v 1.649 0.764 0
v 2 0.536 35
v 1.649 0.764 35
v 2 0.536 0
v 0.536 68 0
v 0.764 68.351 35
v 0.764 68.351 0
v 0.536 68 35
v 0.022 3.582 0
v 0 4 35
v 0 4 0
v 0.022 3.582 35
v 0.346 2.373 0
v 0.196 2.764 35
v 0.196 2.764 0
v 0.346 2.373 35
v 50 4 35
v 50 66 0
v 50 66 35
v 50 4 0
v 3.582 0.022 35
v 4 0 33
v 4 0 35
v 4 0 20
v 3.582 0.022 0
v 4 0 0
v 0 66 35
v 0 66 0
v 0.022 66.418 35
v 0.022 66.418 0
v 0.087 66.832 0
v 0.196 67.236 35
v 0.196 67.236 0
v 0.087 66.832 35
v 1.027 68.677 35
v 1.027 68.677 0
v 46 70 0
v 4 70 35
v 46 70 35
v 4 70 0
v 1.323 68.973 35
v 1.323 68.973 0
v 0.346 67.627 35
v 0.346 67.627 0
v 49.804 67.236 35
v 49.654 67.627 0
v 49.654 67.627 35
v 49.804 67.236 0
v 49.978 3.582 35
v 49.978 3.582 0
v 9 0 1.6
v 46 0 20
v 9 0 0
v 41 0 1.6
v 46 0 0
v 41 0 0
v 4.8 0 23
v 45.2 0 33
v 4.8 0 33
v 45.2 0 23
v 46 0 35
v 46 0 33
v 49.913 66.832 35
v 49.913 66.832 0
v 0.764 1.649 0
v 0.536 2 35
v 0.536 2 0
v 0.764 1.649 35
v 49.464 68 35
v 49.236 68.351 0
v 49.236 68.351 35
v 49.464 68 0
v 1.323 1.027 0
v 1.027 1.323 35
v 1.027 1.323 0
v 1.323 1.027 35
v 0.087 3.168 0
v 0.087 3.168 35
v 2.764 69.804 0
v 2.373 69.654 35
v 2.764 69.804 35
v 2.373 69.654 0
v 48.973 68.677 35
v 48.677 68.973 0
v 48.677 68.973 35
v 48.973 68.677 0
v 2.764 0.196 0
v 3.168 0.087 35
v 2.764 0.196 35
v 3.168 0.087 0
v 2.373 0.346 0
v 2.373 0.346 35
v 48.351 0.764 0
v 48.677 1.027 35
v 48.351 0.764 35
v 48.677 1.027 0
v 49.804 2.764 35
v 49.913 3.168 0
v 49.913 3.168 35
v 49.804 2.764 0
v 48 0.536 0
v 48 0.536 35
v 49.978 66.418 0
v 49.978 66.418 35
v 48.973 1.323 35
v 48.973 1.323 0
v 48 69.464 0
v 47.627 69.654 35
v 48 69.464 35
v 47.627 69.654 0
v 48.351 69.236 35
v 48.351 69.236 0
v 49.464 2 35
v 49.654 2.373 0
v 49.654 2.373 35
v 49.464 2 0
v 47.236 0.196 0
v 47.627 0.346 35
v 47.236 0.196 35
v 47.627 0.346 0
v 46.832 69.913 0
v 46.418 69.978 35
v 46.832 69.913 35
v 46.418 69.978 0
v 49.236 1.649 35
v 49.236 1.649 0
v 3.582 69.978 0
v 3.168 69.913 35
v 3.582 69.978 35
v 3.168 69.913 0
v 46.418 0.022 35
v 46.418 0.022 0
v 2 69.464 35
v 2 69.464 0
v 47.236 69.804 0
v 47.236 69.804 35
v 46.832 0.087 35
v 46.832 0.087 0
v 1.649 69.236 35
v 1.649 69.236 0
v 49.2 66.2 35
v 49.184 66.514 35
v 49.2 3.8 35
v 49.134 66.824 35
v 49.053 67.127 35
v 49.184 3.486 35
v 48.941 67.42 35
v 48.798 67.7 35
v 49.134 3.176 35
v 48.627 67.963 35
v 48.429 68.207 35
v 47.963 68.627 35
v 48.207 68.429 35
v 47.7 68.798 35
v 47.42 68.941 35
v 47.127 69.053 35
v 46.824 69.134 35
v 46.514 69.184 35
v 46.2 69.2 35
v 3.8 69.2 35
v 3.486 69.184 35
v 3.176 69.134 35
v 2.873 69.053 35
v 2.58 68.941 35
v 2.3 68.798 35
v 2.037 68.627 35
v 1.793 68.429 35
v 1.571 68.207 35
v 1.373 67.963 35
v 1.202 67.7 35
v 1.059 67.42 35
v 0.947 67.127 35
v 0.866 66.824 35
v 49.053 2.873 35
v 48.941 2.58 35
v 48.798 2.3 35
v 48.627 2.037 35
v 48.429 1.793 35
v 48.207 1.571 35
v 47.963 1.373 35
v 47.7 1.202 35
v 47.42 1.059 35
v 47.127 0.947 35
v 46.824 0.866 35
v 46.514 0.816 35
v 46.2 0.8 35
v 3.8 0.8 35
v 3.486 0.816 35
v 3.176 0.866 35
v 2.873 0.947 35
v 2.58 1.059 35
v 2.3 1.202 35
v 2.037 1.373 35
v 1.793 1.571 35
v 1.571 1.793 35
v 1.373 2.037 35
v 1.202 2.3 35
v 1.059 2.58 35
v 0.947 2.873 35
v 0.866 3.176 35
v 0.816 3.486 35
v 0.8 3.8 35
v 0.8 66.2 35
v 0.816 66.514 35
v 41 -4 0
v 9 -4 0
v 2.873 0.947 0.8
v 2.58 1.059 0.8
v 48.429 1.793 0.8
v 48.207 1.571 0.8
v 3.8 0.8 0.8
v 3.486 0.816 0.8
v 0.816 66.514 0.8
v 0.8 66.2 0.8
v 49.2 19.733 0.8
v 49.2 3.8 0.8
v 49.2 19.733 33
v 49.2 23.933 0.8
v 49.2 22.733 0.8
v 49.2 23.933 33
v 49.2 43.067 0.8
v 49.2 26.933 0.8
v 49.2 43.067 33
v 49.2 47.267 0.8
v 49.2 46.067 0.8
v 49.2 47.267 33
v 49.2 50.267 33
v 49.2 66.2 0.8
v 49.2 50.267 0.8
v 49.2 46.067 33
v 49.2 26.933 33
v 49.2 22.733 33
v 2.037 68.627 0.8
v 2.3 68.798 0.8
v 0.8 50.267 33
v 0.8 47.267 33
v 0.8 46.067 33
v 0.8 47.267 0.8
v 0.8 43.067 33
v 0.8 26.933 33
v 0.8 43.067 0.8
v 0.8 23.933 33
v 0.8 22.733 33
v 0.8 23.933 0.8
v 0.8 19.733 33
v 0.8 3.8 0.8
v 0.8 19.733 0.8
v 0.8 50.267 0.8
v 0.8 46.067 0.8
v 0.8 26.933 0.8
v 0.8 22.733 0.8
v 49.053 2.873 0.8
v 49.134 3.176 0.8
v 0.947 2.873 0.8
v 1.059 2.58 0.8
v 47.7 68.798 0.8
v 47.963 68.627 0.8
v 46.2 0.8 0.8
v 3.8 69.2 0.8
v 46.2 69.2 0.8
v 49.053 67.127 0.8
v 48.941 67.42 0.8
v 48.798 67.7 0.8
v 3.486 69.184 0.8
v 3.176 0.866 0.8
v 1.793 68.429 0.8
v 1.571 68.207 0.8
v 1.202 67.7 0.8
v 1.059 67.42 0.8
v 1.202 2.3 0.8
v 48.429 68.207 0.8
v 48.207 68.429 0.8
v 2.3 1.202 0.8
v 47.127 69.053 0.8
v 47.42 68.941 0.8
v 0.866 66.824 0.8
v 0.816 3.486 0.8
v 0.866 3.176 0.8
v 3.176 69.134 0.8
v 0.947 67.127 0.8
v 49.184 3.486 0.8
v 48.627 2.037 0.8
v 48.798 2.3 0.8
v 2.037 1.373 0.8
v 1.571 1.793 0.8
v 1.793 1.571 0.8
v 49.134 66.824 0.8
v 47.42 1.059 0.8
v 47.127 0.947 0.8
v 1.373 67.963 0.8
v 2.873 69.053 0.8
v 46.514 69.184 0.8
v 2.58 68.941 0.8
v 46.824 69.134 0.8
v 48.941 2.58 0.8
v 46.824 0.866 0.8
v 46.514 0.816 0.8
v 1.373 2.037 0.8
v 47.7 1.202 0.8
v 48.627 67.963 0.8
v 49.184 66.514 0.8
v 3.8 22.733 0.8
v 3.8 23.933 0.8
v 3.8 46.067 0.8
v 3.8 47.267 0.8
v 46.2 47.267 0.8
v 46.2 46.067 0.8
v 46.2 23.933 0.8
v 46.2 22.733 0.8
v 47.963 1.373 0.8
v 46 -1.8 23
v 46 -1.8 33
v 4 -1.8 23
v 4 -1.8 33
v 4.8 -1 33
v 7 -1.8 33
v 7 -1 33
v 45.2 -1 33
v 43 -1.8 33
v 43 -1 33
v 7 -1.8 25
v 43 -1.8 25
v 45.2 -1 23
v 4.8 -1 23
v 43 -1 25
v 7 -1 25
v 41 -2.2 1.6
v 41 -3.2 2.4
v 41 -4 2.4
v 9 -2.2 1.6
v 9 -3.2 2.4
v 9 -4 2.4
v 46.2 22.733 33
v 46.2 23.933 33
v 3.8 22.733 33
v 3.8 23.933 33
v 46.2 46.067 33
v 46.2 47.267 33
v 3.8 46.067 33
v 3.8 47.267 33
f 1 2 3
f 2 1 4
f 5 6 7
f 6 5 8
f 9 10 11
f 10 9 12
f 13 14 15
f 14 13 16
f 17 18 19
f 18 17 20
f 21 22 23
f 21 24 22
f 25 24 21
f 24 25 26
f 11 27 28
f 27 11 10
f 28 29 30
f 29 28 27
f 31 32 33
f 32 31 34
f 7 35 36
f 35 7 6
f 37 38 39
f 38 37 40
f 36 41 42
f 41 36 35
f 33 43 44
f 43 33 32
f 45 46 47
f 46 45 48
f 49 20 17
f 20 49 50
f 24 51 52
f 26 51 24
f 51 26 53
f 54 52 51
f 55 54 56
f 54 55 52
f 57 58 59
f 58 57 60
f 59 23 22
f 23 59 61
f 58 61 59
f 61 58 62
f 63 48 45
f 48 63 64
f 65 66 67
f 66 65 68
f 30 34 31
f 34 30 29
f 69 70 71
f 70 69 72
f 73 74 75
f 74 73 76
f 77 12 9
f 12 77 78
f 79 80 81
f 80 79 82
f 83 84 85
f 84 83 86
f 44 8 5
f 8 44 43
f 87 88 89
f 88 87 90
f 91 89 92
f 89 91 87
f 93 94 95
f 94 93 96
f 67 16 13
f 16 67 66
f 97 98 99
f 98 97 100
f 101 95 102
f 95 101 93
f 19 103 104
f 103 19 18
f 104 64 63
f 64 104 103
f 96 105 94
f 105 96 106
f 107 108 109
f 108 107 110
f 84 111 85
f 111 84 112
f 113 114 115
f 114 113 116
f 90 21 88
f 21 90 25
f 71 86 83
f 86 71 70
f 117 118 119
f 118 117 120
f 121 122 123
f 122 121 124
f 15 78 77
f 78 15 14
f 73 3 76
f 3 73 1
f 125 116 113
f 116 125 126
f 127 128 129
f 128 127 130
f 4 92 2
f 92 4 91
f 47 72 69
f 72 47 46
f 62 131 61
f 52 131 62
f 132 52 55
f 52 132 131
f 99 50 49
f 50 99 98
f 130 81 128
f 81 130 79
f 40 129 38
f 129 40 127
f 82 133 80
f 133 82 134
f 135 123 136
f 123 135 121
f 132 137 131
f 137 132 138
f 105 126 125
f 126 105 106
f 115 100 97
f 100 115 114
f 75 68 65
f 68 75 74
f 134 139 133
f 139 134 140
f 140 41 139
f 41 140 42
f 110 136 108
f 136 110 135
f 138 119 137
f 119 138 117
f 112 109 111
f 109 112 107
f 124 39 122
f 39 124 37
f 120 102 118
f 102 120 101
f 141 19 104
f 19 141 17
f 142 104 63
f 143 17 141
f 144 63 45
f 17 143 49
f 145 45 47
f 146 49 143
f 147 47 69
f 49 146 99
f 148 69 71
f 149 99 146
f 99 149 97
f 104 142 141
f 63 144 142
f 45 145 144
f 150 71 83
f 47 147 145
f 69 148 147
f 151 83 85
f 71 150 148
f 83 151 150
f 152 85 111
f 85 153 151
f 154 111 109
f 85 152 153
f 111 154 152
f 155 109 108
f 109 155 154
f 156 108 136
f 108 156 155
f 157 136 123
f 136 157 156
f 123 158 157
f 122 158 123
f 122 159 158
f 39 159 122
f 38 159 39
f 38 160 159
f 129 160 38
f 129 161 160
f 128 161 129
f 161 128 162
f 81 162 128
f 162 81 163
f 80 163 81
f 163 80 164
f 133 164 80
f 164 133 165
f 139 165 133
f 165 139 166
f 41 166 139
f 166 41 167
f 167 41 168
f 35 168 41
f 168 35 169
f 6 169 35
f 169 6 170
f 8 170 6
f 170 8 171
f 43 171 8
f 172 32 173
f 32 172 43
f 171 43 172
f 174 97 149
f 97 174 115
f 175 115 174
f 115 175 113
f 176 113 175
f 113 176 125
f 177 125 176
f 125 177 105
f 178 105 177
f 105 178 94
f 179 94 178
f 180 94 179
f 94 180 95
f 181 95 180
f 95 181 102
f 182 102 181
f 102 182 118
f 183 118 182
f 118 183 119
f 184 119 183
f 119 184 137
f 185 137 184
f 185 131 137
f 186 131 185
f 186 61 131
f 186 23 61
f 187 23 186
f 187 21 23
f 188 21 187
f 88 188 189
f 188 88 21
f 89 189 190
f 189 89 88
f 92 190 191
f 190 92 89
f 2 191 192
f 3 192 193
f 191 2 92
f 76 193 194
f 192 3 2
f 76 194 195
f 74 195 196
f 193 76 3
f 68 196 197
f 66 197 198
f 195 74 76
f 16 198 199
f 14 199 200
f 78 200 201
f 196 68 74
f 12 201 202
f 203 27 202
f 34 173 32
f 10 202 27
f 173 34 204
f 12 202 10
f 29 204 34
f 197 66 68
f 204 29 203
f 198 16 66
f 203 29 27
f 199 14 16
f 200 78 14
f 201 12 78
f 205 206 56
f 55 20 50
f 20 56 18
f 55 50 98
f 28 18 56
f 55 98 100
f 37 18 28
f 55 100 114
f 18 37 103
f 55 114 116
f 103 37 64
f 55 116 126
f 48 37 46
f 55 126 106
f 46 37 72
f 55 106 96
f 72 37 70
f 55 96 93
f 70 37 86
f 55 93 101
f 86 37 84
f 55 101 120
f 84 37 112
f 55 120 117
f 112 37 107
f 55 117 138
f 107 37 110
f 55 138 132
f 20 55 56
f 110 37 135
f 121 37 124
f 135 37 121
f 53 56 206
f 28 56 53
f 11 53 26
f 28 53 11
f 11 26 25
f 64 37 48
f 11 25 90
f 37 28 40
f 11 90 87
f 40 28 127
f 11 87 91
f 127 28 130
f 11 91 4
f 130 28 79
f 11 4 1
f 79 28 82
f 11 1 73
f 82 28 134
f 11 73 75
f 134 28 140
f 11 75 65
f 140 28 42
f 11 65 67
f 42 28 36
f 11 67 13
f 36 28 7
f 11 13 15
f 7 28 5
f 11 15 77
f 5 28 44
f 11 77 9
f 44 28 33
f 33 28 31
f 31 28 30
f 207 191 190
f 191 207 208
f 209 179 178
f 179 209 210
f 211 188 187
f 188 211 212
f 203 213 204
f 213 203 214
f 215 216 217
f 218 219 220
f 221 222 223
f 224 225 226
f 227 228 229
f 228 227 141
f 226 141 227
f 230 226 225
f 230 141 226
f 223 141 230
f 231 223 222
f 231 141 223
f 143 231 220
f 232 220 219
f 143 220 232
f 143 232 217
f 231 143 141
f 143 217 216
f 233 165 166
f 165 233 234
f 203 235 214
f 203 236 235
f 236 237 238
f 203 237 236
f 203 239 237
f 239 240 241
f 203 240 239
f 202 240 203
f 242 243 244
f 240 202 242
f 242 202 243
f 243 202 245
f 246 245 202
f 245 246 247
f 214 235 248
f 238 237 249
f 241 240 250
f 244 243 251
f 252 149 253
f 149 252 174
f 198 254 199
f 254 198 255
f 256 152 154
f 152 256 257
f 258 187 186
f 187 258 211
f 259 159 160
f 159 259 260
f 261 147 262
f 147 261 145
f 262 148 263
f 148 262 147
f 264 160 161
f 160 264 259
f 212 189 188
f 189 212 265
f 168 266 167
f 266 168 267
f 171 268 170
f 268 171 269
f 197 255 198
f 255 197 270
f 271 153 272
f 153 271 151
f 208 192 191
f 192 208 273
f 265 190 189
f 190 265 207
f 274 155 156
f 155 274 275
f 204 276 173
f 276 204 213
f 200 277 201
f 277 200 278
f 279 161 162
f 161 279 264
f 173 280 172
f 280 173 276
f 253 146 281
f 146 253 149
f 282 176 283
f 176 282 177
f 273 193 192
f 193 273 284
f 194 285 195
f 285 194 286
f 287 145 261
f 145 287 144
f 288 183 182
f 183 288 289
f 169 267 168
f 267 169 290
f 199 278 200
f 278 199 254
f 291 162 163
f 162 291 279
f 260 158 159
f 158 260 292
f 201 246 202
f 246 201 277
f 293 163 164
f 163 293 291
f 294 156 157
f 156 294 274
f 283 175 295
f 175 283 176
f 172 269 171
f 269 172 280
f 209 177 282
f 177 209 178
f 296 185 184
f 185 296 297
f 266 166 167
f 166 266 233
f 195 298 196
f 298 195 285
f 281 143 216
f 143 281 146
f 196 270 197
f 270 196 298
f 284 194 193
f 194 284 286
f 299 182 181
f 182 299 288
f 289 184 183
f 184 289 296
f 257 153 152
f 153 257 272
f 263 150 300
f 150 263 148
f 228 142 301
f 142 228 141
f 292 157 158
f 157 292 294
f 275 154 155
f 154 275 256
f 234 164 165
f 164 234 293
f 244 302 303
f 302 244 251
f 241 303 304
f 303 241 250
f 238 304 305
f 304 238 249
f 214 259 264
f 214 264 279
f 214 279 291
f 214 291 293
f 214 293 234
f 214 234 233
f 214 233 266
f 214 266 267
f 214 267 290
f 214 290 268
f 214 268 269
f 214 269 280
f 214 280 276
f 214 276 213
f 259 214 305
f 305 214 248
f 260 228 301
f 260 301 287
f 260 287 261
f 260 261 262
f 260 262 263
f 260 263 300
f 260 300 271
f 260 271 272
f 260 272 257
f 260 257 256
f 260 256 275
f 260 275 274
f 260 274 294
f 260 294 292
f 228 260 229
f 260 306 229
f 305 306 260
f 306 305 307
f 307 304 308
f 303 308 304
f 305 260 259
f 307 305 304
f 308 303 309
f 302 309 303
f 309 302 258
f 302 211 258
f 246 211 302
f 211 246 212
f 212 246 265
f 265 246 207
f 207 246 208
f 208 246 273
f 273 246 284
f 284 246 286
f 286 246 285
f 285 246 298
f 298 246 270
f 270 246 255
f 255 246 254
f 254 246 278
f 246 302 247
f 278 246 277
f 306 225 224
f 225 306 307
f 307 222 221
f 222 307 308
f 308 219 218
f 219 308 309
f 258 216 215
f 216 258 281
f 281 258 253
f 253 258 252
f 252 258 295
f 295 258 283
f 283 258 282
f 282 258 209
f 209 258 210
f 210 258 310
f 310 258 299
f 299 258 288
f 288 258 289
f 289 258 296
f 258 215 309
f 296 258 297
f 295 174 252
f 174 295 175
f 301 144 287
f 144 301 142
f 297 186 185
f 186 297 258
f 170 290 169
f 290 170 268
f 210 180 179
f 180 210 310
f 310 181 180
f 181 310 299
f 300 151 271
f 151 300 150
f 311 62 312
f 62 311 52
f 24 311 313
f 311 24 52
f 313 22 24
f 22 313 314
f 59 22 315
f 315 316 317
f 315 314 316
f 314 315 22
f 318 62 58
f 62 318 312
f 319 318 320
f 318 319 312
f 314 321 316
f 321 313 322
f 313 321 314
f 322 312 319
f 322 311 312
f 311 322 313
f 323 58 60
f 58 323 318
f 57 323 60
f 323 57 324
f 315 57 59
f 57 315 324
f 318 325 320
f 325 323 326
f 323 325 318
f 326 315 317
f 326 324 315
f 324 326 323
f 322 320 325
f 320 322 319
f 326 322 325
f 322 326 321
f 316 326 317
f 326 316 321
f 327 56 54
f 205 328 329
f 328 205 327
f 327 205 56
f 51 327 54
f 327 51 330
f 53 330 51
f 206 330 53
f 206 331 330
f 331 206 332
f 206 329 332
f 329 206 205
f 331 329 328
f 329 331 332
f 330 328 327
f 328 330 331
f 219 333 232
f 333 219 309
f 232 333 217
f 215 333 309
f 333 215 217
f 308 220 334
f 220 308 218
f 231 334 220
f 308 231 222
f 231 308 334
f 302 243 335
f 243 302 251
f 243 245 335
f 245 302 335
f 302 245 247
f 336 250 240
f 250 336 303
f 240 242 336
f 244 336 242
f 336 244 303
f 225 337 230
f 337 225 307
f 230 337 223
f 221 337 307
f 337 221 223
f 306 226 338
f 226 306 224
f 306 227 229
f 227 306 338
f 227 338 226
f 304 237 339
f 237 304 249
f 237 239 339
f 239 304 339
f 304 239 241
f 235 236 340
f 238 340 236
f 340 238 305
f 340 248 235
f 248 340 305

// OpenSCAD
// little boxes - with handle, tag, separators and lid
// version 0.0.3
// by pixelhaufen
// is licensed under CC BY-SA 3.0 -> https://creativecommons.org/licenses/by-sa/3.0/

//------------------------------------------------------------------
// User Inputs

// create a seperate model for box, lid and separator
type = "box"; // [box,lid,separator]

/* [box] */
box_tag = "yes"; // [yes,no]
box_handle = "yes"; // [yes,no]
separators = 2; //[0:1:3]

/* [size] */
// without lid
width = 50; //[30:200]
// without lid, tag or handle
lenght = 70; //[12:200]
// without lid
height = 35; //[20:200]
// prints best with a multiple of the nozzle diameter
shell = 0.8; //[0.2:0.05:1.5]

/* [experimental] */
stackable = "no"; // [yes,no]

/*[Hidden]*/
$fn=60;

//------------------------------------------------------------------
// Main

if (type=="box")
{
    box([width,lenght,height],shell);
    if(box_tag=="yes")
    {
        tag(width,height,shell);
    }
    if(box_handle=="yes")
    {
        handle(width,shell);
    }
    separator_handle(width,lenght,height,shell,separators);
    
    if(stackable=="yes")
    {
        stackable(width,lenght,height);
    }
}
else if(type=="lid")
{
    lid([width,lenght,3],shell,stackable);
}
else if(type=="separator")
{
    separator(width,height,shell);
}

//------------------------------------------------------------------
// Modules

module separator(width,height,shell)
{
    cube([width-2*shell-0.2,height-shell-2,1]);
}

module stackable(width,lenght,height)
{
    translate([width, lenght/4, height-2])
        rotate([90, 0, 90])
            prism(lenght/2,3,1+shell);
    translate([0, lenght*3/4, height-2])
        rotate([90, 0, -90])
            prism(lenght/2,3,1+shell);
    translate([width*3/4, lenght, height-2])
        rotate([90, 0, 180])
            prism(width/2,3,1+shell);
}

module separator_handle(width,lenght,height,shell,separators)
{
    separators_lenght=lenght/(separators+1);
    if(separators > 0)
    {
        for (i = [1:separators])
        {
            separator_handle_create(width,separators_lenght*i,height,shell,separators);
        }
    }
}

module separator_handle_create(width,lenght,height,shell,separators)
{   
    translate([width-shell, lenght-0.6-3, 0])
        rotate([0, -90, 0])
            prism(height-2,3,3);
    translate([width-3-shell, lenght+0.6, 0])
        rotate([-90, -90, 0])
            prism(height-2,3,3);
    translate([3+shell, lenght-0.6, 0])
        rotate([90, -90, 0])
            prism(height-2,3,3);
    translate([shell, lenght+0.6+3, 0])
        rotate([180, -90, 0])
            prism(height-2,3,3);
}

module tag(width,height,shell)
{
    difference()
    {
        union()
        {
            translate([4, 0, height-15])
                rotate([90, 0, 0])
                    prism(width-8,3,1+shell);
            translate([4, -1-shell, height-12])
                cube([width-8, 1+shell, 10], center=false);
        }
        
        translate([4+shell, -1, height-12])
            cube([width-8-shell*2, 1, 11], center=false);
        translate([7, -2.5, height-10])
            cube([width-14, 2, 10], center=false);
    }
}

module handle(width,shell)
{
    translate([9, -5*shell, 0])
        cube([width-18, 5*shell, 2*shell], center=false);

    translate([9, -5*shell, 2*shell])
        cube([width-18, shell, shell], center=false);

    translate([9, -5*shell+shell, 3*shell])
        rotate([-90, 0, 0])
            prism(width-18,shell,1);
}

module prism(lenght, width, height)
{
    polyhedron
    (
        points=[[0, 0, 0], [lenght, 0, 0], [lenght, width, 0], [0, width, 0], [0, width, height], [lenght, width, height]],
        faces=[[0, 1, 2, 3], [5, 4, 3, 2], [0, 4, 5, 1], [0, 3, 4], [5, 2, 1]]
    );
}

module lid(size,shell,stackable,radius=5)
{
    translate([shell, shell, shell])
    {
        difference()
        {
            translate([-1*shell, -1*shell, -shell])
                main_box([size[0]+shell*2,size[1]+shell*2,size[2]],radius);
            
            union()
            {
                main_box([size[0],size[1],size[2]],radius-shell);
                if(stackable=="yes")
                {
                    translate([size[0]/4-0.1, -1.5*shell, -shell-0.1])
                        cube([size[0]/2+0.2, shell*2, size[2]+0.2], center=false);
                    translate([size[0]/4-0.1, -0.5*shell+size[1], -shell-0.1])
                        cube([size[0]/2+0.2, shell*2, size[2]+0.2], center=false);
                    translate([-1.5*shell, size[1]/4-0.1, -shell-0.1])
                        cube([shell*2, size[1]/2+0.2, size[2]+0.2], center=false);
                    translate([-0.5*shell+size[0], size[1]/4-0.1, -shell-0.1])
                        cube([shell*2, size[1]/2+0.2, size[2]+0.2], center=false);
                }
            }
        }
        difference()
        {
            translate([shell+0.2, shell+0.2, 0])
                main_box([size[0]-shell*2-0.2*2,size[1]-shell*2-0.2*2,shell/2],radius-2*shell);
            
            translate([2*shell+0.2, 2*shell+0.2, 0])
                main_box([size[0]-shell*4-0.2*2,size[1]-shell*4-0.2*2,shell],radius-3*shell);
        }
    }
}

module box(size,shell,radius=4)
{
    difference()
    {
        main_box(size,radius);
        
        translate([shell, shell, shell])
            main_box([size[0]-shell*2,size[1]-shell*2,size[2]],radius-1);
    }
}

module main_box(size,radius=3)
{
    hull()
    {
        translate([radius, radius, 0])
            cylinder(r1=radius, r2=radius, h=size[2], center=false);
        translate([size[0]-radius, radius, 0])
            cylinder(r1=radius, r2=radius, h=size[2], center=false);
        translate([radius, size[1]-radius, 0])
            cylinder(r1=radius, r2=radius, h=size[2], center=false);
        translate([size[0]-radius, size[1]-radius, 0])
            cylinder(r1=radius, r2=radius, h=size[2], center=false);
    }
}
